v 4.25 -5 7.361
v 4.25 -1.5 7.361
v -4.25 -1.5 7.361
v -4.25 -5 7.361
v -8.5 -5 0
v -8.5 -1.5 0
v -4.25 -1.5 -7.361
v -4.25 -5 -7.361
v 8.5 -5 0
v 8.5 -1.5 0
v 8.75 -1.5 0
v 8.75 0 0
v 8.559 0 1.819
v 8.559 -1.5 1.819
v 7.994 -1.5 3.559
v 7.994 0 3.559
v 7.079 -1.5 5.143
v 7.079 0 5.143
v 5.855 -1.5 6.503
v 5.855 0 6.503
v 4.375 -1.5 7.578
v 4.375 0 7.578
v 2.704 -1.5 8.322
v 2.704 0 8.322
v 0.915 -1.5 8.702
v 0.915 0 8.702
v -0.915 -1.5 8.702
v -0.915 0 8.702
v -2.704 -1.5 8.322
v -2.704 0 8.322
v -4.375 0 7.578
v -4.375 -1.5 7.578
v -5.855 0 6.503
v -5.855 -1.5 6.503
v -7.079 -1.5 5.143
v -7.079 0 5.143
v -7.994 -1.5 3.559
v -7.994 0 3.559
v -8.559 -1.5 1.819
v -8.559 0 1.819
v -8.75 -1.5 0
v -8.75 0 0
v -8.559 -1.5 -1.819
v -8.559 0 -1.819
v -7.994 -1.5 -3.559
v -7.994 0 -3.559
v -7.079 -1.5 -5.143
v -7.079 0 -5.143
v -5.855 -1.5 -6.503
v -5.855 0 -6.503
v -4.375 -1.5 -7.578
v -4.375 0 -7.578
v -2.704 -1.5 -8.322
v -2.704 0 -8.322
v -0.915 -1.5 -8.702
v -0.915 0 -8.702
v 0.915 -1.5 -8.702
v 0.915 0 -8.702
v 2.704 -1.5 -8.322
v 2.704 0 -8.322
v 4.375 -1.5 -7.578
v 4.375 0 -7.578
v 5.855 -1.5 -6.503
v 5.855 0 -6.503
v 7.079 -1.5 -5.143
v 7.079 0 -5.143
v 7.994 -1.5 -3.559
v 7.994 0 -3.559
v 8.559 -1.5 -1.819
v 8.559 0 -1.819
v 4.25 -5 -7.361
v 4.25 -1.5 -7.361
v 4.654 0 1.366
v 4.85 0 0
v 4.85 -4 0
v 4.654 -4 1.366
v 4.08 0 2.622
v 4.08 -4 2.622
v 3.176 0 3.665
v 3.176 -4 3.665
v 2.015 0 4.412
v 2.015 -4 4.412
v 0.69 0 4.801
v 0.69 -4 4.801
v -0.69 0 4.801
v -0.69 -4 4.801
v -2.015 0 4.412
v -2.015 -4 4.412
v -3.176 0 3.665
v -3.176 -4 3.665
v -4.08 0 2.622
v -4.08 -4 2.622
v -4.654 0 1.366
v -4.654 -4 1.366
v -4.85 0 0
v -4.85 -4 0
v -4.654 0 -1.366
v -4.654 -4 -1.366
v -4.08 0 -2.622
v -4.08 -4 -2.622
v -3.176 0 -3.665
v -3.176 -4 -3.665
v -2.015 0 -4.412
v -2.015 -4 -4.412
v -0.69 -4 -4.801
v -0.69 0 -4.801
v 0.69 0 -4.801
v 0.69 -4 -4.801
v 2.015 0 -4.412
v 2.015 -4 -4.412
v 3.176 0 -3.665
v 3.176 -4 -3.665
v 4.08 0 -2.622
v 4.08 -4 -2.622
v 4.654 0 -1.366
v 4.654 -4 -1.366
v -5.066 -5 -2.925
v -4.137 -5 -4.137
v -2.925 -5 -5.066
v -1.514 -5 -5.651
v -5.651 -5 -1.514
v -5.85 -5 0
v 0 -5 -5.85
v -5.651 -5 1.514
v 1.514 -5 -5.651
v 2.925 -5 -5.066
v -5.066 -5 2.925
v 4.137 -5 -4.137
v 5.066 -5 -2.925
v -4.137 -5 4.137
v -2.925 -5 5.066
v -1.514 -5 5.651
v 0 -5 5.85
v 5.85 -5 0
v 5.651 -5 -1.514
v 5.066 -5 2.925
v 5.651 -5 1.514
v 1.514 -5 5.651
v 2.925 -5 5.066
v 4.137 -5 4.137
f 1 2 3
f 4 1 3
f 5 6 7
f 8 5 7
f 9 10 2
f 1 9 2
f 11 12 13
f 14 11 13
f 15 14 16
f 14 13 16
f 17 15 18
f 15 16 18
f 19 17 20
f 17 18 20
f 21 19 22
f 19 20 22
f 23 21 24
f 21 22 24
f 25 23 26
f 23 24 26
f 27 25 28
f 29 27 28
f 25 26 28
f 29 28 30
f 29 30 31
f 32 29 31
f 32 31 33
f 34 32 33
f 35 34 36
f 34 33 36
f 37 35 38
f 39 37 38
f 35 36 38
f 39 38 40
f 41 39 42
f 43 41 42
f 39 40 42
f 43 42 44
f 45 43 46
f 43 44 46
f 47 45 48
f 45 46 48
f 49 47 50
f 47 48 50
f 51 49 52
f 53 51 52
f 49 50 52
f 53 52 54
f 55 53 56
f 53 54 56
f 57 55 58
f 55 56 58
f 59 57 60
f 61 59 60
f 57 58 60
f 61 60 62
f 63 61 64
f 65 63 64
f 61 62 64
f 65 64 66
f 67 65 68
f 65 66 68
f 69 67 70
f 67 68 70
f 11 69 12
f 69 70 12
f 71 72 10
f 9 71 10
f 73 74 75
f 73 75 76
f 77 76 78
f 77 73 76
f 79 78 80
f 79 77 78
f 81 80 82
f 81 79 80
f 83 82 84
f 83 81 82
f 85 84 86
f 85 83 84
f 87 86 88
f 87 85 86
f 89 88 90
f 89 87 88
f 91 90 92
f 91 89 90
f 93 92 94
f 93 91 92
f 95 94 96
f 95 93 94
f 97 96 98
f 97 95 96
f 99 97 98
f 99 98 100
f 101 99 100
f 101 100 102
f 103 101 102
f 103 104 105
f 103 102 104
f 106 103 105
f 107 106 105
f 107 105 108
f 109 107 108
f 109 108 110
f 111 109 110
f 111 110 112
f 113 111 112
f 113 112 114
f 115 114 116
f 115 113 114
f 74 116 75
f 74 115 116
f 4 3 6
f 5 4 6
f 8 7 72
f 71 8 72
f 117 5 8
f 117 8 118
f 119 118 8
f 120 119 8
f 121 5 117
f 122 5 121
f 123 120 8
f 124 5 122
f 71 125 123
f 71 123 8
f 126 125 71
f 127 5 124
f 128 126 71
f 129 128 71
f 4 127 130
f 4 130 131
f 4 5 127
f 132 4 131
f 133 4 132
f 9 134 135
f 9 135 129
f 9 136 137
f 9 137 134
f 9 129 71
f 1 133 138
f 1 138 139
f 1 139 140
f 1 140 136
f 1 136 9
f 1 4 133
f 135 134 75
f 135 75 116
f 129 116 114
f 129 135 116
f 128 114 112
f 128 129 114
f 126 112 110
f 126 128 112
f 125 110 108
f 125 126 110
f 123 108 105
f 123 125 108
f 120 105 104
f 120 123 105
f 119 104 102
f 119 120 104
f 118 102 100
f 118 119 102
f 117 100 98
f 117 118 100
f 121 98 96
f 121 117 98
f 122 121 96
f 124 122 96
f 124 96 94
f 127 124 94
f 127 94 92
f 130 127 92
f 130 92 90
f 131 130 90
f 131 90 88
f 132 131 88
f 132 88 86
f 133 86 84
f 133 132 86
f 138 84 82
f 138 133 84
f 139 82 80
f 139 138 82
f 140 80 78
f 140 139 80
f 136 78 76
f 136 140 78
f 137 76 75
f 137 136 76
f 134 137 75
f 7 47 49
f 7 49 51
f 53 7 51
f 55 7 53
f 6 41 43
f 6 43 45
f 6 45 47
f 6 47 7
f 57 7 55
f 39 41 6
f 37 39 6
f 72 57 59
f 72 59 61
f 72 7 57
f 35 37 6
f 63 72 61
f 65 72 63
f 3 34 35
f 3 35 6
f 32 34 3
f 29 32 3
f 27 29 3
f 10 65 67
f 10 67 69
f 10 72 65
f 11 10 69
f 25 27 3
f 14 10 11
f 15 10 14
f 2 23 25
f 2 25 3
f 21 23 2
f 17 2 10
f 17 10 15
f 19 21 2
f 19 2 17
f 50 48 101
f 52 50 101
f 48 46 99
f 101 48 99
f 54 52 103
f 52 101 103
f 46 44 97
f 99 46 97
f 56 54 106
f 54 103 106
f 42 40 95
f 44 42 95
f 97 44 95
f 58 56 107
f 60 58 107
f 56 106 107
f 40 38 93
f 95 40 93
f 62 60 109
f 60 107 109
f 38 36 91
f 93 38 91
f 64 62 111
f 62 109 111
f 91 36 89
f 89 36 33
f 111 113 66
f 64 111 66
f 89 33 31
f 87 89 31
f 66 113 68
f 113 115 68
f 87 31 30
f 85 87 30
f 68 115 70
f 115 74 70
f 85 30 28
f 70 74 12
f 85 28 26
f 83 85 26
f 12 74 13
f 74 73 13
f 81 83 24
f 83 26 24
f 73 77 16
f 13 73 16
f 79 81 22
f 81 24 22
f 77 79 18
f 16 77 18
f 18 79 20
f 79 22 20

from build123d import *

# Parameters (mm, degrees)
SKETCH_R     = 8.75
PAD_DEPTH    = 1.5
PAD001_DEPTH = 3.5
SKETCH002_R  = 4.85
POCKET_DEPTH = 7
CHAMFER_SIZE = 1


with BuildPart() as part:
    # Sketch → Pad (new body)
    with BuildSketch(Plane.XZ):
        Circle(SKETCH_R)
    extrude(amount=PAD_DEPTH)

    # Sketch001 (on Face3 of Pad) → Pad001 (join)
    with BuildSketch(Plane.XZ.offset(1.5)):
        Polygon((8.5, 0), (4.25, 7.361216), (-4.25, 7.361216), (-8.5, 0), (-4.25, -7.361216), (4.25, -7.361216), align=None)
    extrude(amount=PAD001_DEPTH)

    # Sketch002 → Pocket (cut)
    with BuildSketch(Plane.XZ):
        Circle(SKETCH002_R)
    extrude(amount=POCKET_DEPTH, mode=Mode.SUBTRACT)

    # Chamfer
    chamfer_edges = [part.edges().sort_by_distance(p)[0] for p in [
        (-4.85, -5, 0),
    ]]
    chamfer(chamfer_edges, length=CHAMFER_SIZE)


solid = part.part
